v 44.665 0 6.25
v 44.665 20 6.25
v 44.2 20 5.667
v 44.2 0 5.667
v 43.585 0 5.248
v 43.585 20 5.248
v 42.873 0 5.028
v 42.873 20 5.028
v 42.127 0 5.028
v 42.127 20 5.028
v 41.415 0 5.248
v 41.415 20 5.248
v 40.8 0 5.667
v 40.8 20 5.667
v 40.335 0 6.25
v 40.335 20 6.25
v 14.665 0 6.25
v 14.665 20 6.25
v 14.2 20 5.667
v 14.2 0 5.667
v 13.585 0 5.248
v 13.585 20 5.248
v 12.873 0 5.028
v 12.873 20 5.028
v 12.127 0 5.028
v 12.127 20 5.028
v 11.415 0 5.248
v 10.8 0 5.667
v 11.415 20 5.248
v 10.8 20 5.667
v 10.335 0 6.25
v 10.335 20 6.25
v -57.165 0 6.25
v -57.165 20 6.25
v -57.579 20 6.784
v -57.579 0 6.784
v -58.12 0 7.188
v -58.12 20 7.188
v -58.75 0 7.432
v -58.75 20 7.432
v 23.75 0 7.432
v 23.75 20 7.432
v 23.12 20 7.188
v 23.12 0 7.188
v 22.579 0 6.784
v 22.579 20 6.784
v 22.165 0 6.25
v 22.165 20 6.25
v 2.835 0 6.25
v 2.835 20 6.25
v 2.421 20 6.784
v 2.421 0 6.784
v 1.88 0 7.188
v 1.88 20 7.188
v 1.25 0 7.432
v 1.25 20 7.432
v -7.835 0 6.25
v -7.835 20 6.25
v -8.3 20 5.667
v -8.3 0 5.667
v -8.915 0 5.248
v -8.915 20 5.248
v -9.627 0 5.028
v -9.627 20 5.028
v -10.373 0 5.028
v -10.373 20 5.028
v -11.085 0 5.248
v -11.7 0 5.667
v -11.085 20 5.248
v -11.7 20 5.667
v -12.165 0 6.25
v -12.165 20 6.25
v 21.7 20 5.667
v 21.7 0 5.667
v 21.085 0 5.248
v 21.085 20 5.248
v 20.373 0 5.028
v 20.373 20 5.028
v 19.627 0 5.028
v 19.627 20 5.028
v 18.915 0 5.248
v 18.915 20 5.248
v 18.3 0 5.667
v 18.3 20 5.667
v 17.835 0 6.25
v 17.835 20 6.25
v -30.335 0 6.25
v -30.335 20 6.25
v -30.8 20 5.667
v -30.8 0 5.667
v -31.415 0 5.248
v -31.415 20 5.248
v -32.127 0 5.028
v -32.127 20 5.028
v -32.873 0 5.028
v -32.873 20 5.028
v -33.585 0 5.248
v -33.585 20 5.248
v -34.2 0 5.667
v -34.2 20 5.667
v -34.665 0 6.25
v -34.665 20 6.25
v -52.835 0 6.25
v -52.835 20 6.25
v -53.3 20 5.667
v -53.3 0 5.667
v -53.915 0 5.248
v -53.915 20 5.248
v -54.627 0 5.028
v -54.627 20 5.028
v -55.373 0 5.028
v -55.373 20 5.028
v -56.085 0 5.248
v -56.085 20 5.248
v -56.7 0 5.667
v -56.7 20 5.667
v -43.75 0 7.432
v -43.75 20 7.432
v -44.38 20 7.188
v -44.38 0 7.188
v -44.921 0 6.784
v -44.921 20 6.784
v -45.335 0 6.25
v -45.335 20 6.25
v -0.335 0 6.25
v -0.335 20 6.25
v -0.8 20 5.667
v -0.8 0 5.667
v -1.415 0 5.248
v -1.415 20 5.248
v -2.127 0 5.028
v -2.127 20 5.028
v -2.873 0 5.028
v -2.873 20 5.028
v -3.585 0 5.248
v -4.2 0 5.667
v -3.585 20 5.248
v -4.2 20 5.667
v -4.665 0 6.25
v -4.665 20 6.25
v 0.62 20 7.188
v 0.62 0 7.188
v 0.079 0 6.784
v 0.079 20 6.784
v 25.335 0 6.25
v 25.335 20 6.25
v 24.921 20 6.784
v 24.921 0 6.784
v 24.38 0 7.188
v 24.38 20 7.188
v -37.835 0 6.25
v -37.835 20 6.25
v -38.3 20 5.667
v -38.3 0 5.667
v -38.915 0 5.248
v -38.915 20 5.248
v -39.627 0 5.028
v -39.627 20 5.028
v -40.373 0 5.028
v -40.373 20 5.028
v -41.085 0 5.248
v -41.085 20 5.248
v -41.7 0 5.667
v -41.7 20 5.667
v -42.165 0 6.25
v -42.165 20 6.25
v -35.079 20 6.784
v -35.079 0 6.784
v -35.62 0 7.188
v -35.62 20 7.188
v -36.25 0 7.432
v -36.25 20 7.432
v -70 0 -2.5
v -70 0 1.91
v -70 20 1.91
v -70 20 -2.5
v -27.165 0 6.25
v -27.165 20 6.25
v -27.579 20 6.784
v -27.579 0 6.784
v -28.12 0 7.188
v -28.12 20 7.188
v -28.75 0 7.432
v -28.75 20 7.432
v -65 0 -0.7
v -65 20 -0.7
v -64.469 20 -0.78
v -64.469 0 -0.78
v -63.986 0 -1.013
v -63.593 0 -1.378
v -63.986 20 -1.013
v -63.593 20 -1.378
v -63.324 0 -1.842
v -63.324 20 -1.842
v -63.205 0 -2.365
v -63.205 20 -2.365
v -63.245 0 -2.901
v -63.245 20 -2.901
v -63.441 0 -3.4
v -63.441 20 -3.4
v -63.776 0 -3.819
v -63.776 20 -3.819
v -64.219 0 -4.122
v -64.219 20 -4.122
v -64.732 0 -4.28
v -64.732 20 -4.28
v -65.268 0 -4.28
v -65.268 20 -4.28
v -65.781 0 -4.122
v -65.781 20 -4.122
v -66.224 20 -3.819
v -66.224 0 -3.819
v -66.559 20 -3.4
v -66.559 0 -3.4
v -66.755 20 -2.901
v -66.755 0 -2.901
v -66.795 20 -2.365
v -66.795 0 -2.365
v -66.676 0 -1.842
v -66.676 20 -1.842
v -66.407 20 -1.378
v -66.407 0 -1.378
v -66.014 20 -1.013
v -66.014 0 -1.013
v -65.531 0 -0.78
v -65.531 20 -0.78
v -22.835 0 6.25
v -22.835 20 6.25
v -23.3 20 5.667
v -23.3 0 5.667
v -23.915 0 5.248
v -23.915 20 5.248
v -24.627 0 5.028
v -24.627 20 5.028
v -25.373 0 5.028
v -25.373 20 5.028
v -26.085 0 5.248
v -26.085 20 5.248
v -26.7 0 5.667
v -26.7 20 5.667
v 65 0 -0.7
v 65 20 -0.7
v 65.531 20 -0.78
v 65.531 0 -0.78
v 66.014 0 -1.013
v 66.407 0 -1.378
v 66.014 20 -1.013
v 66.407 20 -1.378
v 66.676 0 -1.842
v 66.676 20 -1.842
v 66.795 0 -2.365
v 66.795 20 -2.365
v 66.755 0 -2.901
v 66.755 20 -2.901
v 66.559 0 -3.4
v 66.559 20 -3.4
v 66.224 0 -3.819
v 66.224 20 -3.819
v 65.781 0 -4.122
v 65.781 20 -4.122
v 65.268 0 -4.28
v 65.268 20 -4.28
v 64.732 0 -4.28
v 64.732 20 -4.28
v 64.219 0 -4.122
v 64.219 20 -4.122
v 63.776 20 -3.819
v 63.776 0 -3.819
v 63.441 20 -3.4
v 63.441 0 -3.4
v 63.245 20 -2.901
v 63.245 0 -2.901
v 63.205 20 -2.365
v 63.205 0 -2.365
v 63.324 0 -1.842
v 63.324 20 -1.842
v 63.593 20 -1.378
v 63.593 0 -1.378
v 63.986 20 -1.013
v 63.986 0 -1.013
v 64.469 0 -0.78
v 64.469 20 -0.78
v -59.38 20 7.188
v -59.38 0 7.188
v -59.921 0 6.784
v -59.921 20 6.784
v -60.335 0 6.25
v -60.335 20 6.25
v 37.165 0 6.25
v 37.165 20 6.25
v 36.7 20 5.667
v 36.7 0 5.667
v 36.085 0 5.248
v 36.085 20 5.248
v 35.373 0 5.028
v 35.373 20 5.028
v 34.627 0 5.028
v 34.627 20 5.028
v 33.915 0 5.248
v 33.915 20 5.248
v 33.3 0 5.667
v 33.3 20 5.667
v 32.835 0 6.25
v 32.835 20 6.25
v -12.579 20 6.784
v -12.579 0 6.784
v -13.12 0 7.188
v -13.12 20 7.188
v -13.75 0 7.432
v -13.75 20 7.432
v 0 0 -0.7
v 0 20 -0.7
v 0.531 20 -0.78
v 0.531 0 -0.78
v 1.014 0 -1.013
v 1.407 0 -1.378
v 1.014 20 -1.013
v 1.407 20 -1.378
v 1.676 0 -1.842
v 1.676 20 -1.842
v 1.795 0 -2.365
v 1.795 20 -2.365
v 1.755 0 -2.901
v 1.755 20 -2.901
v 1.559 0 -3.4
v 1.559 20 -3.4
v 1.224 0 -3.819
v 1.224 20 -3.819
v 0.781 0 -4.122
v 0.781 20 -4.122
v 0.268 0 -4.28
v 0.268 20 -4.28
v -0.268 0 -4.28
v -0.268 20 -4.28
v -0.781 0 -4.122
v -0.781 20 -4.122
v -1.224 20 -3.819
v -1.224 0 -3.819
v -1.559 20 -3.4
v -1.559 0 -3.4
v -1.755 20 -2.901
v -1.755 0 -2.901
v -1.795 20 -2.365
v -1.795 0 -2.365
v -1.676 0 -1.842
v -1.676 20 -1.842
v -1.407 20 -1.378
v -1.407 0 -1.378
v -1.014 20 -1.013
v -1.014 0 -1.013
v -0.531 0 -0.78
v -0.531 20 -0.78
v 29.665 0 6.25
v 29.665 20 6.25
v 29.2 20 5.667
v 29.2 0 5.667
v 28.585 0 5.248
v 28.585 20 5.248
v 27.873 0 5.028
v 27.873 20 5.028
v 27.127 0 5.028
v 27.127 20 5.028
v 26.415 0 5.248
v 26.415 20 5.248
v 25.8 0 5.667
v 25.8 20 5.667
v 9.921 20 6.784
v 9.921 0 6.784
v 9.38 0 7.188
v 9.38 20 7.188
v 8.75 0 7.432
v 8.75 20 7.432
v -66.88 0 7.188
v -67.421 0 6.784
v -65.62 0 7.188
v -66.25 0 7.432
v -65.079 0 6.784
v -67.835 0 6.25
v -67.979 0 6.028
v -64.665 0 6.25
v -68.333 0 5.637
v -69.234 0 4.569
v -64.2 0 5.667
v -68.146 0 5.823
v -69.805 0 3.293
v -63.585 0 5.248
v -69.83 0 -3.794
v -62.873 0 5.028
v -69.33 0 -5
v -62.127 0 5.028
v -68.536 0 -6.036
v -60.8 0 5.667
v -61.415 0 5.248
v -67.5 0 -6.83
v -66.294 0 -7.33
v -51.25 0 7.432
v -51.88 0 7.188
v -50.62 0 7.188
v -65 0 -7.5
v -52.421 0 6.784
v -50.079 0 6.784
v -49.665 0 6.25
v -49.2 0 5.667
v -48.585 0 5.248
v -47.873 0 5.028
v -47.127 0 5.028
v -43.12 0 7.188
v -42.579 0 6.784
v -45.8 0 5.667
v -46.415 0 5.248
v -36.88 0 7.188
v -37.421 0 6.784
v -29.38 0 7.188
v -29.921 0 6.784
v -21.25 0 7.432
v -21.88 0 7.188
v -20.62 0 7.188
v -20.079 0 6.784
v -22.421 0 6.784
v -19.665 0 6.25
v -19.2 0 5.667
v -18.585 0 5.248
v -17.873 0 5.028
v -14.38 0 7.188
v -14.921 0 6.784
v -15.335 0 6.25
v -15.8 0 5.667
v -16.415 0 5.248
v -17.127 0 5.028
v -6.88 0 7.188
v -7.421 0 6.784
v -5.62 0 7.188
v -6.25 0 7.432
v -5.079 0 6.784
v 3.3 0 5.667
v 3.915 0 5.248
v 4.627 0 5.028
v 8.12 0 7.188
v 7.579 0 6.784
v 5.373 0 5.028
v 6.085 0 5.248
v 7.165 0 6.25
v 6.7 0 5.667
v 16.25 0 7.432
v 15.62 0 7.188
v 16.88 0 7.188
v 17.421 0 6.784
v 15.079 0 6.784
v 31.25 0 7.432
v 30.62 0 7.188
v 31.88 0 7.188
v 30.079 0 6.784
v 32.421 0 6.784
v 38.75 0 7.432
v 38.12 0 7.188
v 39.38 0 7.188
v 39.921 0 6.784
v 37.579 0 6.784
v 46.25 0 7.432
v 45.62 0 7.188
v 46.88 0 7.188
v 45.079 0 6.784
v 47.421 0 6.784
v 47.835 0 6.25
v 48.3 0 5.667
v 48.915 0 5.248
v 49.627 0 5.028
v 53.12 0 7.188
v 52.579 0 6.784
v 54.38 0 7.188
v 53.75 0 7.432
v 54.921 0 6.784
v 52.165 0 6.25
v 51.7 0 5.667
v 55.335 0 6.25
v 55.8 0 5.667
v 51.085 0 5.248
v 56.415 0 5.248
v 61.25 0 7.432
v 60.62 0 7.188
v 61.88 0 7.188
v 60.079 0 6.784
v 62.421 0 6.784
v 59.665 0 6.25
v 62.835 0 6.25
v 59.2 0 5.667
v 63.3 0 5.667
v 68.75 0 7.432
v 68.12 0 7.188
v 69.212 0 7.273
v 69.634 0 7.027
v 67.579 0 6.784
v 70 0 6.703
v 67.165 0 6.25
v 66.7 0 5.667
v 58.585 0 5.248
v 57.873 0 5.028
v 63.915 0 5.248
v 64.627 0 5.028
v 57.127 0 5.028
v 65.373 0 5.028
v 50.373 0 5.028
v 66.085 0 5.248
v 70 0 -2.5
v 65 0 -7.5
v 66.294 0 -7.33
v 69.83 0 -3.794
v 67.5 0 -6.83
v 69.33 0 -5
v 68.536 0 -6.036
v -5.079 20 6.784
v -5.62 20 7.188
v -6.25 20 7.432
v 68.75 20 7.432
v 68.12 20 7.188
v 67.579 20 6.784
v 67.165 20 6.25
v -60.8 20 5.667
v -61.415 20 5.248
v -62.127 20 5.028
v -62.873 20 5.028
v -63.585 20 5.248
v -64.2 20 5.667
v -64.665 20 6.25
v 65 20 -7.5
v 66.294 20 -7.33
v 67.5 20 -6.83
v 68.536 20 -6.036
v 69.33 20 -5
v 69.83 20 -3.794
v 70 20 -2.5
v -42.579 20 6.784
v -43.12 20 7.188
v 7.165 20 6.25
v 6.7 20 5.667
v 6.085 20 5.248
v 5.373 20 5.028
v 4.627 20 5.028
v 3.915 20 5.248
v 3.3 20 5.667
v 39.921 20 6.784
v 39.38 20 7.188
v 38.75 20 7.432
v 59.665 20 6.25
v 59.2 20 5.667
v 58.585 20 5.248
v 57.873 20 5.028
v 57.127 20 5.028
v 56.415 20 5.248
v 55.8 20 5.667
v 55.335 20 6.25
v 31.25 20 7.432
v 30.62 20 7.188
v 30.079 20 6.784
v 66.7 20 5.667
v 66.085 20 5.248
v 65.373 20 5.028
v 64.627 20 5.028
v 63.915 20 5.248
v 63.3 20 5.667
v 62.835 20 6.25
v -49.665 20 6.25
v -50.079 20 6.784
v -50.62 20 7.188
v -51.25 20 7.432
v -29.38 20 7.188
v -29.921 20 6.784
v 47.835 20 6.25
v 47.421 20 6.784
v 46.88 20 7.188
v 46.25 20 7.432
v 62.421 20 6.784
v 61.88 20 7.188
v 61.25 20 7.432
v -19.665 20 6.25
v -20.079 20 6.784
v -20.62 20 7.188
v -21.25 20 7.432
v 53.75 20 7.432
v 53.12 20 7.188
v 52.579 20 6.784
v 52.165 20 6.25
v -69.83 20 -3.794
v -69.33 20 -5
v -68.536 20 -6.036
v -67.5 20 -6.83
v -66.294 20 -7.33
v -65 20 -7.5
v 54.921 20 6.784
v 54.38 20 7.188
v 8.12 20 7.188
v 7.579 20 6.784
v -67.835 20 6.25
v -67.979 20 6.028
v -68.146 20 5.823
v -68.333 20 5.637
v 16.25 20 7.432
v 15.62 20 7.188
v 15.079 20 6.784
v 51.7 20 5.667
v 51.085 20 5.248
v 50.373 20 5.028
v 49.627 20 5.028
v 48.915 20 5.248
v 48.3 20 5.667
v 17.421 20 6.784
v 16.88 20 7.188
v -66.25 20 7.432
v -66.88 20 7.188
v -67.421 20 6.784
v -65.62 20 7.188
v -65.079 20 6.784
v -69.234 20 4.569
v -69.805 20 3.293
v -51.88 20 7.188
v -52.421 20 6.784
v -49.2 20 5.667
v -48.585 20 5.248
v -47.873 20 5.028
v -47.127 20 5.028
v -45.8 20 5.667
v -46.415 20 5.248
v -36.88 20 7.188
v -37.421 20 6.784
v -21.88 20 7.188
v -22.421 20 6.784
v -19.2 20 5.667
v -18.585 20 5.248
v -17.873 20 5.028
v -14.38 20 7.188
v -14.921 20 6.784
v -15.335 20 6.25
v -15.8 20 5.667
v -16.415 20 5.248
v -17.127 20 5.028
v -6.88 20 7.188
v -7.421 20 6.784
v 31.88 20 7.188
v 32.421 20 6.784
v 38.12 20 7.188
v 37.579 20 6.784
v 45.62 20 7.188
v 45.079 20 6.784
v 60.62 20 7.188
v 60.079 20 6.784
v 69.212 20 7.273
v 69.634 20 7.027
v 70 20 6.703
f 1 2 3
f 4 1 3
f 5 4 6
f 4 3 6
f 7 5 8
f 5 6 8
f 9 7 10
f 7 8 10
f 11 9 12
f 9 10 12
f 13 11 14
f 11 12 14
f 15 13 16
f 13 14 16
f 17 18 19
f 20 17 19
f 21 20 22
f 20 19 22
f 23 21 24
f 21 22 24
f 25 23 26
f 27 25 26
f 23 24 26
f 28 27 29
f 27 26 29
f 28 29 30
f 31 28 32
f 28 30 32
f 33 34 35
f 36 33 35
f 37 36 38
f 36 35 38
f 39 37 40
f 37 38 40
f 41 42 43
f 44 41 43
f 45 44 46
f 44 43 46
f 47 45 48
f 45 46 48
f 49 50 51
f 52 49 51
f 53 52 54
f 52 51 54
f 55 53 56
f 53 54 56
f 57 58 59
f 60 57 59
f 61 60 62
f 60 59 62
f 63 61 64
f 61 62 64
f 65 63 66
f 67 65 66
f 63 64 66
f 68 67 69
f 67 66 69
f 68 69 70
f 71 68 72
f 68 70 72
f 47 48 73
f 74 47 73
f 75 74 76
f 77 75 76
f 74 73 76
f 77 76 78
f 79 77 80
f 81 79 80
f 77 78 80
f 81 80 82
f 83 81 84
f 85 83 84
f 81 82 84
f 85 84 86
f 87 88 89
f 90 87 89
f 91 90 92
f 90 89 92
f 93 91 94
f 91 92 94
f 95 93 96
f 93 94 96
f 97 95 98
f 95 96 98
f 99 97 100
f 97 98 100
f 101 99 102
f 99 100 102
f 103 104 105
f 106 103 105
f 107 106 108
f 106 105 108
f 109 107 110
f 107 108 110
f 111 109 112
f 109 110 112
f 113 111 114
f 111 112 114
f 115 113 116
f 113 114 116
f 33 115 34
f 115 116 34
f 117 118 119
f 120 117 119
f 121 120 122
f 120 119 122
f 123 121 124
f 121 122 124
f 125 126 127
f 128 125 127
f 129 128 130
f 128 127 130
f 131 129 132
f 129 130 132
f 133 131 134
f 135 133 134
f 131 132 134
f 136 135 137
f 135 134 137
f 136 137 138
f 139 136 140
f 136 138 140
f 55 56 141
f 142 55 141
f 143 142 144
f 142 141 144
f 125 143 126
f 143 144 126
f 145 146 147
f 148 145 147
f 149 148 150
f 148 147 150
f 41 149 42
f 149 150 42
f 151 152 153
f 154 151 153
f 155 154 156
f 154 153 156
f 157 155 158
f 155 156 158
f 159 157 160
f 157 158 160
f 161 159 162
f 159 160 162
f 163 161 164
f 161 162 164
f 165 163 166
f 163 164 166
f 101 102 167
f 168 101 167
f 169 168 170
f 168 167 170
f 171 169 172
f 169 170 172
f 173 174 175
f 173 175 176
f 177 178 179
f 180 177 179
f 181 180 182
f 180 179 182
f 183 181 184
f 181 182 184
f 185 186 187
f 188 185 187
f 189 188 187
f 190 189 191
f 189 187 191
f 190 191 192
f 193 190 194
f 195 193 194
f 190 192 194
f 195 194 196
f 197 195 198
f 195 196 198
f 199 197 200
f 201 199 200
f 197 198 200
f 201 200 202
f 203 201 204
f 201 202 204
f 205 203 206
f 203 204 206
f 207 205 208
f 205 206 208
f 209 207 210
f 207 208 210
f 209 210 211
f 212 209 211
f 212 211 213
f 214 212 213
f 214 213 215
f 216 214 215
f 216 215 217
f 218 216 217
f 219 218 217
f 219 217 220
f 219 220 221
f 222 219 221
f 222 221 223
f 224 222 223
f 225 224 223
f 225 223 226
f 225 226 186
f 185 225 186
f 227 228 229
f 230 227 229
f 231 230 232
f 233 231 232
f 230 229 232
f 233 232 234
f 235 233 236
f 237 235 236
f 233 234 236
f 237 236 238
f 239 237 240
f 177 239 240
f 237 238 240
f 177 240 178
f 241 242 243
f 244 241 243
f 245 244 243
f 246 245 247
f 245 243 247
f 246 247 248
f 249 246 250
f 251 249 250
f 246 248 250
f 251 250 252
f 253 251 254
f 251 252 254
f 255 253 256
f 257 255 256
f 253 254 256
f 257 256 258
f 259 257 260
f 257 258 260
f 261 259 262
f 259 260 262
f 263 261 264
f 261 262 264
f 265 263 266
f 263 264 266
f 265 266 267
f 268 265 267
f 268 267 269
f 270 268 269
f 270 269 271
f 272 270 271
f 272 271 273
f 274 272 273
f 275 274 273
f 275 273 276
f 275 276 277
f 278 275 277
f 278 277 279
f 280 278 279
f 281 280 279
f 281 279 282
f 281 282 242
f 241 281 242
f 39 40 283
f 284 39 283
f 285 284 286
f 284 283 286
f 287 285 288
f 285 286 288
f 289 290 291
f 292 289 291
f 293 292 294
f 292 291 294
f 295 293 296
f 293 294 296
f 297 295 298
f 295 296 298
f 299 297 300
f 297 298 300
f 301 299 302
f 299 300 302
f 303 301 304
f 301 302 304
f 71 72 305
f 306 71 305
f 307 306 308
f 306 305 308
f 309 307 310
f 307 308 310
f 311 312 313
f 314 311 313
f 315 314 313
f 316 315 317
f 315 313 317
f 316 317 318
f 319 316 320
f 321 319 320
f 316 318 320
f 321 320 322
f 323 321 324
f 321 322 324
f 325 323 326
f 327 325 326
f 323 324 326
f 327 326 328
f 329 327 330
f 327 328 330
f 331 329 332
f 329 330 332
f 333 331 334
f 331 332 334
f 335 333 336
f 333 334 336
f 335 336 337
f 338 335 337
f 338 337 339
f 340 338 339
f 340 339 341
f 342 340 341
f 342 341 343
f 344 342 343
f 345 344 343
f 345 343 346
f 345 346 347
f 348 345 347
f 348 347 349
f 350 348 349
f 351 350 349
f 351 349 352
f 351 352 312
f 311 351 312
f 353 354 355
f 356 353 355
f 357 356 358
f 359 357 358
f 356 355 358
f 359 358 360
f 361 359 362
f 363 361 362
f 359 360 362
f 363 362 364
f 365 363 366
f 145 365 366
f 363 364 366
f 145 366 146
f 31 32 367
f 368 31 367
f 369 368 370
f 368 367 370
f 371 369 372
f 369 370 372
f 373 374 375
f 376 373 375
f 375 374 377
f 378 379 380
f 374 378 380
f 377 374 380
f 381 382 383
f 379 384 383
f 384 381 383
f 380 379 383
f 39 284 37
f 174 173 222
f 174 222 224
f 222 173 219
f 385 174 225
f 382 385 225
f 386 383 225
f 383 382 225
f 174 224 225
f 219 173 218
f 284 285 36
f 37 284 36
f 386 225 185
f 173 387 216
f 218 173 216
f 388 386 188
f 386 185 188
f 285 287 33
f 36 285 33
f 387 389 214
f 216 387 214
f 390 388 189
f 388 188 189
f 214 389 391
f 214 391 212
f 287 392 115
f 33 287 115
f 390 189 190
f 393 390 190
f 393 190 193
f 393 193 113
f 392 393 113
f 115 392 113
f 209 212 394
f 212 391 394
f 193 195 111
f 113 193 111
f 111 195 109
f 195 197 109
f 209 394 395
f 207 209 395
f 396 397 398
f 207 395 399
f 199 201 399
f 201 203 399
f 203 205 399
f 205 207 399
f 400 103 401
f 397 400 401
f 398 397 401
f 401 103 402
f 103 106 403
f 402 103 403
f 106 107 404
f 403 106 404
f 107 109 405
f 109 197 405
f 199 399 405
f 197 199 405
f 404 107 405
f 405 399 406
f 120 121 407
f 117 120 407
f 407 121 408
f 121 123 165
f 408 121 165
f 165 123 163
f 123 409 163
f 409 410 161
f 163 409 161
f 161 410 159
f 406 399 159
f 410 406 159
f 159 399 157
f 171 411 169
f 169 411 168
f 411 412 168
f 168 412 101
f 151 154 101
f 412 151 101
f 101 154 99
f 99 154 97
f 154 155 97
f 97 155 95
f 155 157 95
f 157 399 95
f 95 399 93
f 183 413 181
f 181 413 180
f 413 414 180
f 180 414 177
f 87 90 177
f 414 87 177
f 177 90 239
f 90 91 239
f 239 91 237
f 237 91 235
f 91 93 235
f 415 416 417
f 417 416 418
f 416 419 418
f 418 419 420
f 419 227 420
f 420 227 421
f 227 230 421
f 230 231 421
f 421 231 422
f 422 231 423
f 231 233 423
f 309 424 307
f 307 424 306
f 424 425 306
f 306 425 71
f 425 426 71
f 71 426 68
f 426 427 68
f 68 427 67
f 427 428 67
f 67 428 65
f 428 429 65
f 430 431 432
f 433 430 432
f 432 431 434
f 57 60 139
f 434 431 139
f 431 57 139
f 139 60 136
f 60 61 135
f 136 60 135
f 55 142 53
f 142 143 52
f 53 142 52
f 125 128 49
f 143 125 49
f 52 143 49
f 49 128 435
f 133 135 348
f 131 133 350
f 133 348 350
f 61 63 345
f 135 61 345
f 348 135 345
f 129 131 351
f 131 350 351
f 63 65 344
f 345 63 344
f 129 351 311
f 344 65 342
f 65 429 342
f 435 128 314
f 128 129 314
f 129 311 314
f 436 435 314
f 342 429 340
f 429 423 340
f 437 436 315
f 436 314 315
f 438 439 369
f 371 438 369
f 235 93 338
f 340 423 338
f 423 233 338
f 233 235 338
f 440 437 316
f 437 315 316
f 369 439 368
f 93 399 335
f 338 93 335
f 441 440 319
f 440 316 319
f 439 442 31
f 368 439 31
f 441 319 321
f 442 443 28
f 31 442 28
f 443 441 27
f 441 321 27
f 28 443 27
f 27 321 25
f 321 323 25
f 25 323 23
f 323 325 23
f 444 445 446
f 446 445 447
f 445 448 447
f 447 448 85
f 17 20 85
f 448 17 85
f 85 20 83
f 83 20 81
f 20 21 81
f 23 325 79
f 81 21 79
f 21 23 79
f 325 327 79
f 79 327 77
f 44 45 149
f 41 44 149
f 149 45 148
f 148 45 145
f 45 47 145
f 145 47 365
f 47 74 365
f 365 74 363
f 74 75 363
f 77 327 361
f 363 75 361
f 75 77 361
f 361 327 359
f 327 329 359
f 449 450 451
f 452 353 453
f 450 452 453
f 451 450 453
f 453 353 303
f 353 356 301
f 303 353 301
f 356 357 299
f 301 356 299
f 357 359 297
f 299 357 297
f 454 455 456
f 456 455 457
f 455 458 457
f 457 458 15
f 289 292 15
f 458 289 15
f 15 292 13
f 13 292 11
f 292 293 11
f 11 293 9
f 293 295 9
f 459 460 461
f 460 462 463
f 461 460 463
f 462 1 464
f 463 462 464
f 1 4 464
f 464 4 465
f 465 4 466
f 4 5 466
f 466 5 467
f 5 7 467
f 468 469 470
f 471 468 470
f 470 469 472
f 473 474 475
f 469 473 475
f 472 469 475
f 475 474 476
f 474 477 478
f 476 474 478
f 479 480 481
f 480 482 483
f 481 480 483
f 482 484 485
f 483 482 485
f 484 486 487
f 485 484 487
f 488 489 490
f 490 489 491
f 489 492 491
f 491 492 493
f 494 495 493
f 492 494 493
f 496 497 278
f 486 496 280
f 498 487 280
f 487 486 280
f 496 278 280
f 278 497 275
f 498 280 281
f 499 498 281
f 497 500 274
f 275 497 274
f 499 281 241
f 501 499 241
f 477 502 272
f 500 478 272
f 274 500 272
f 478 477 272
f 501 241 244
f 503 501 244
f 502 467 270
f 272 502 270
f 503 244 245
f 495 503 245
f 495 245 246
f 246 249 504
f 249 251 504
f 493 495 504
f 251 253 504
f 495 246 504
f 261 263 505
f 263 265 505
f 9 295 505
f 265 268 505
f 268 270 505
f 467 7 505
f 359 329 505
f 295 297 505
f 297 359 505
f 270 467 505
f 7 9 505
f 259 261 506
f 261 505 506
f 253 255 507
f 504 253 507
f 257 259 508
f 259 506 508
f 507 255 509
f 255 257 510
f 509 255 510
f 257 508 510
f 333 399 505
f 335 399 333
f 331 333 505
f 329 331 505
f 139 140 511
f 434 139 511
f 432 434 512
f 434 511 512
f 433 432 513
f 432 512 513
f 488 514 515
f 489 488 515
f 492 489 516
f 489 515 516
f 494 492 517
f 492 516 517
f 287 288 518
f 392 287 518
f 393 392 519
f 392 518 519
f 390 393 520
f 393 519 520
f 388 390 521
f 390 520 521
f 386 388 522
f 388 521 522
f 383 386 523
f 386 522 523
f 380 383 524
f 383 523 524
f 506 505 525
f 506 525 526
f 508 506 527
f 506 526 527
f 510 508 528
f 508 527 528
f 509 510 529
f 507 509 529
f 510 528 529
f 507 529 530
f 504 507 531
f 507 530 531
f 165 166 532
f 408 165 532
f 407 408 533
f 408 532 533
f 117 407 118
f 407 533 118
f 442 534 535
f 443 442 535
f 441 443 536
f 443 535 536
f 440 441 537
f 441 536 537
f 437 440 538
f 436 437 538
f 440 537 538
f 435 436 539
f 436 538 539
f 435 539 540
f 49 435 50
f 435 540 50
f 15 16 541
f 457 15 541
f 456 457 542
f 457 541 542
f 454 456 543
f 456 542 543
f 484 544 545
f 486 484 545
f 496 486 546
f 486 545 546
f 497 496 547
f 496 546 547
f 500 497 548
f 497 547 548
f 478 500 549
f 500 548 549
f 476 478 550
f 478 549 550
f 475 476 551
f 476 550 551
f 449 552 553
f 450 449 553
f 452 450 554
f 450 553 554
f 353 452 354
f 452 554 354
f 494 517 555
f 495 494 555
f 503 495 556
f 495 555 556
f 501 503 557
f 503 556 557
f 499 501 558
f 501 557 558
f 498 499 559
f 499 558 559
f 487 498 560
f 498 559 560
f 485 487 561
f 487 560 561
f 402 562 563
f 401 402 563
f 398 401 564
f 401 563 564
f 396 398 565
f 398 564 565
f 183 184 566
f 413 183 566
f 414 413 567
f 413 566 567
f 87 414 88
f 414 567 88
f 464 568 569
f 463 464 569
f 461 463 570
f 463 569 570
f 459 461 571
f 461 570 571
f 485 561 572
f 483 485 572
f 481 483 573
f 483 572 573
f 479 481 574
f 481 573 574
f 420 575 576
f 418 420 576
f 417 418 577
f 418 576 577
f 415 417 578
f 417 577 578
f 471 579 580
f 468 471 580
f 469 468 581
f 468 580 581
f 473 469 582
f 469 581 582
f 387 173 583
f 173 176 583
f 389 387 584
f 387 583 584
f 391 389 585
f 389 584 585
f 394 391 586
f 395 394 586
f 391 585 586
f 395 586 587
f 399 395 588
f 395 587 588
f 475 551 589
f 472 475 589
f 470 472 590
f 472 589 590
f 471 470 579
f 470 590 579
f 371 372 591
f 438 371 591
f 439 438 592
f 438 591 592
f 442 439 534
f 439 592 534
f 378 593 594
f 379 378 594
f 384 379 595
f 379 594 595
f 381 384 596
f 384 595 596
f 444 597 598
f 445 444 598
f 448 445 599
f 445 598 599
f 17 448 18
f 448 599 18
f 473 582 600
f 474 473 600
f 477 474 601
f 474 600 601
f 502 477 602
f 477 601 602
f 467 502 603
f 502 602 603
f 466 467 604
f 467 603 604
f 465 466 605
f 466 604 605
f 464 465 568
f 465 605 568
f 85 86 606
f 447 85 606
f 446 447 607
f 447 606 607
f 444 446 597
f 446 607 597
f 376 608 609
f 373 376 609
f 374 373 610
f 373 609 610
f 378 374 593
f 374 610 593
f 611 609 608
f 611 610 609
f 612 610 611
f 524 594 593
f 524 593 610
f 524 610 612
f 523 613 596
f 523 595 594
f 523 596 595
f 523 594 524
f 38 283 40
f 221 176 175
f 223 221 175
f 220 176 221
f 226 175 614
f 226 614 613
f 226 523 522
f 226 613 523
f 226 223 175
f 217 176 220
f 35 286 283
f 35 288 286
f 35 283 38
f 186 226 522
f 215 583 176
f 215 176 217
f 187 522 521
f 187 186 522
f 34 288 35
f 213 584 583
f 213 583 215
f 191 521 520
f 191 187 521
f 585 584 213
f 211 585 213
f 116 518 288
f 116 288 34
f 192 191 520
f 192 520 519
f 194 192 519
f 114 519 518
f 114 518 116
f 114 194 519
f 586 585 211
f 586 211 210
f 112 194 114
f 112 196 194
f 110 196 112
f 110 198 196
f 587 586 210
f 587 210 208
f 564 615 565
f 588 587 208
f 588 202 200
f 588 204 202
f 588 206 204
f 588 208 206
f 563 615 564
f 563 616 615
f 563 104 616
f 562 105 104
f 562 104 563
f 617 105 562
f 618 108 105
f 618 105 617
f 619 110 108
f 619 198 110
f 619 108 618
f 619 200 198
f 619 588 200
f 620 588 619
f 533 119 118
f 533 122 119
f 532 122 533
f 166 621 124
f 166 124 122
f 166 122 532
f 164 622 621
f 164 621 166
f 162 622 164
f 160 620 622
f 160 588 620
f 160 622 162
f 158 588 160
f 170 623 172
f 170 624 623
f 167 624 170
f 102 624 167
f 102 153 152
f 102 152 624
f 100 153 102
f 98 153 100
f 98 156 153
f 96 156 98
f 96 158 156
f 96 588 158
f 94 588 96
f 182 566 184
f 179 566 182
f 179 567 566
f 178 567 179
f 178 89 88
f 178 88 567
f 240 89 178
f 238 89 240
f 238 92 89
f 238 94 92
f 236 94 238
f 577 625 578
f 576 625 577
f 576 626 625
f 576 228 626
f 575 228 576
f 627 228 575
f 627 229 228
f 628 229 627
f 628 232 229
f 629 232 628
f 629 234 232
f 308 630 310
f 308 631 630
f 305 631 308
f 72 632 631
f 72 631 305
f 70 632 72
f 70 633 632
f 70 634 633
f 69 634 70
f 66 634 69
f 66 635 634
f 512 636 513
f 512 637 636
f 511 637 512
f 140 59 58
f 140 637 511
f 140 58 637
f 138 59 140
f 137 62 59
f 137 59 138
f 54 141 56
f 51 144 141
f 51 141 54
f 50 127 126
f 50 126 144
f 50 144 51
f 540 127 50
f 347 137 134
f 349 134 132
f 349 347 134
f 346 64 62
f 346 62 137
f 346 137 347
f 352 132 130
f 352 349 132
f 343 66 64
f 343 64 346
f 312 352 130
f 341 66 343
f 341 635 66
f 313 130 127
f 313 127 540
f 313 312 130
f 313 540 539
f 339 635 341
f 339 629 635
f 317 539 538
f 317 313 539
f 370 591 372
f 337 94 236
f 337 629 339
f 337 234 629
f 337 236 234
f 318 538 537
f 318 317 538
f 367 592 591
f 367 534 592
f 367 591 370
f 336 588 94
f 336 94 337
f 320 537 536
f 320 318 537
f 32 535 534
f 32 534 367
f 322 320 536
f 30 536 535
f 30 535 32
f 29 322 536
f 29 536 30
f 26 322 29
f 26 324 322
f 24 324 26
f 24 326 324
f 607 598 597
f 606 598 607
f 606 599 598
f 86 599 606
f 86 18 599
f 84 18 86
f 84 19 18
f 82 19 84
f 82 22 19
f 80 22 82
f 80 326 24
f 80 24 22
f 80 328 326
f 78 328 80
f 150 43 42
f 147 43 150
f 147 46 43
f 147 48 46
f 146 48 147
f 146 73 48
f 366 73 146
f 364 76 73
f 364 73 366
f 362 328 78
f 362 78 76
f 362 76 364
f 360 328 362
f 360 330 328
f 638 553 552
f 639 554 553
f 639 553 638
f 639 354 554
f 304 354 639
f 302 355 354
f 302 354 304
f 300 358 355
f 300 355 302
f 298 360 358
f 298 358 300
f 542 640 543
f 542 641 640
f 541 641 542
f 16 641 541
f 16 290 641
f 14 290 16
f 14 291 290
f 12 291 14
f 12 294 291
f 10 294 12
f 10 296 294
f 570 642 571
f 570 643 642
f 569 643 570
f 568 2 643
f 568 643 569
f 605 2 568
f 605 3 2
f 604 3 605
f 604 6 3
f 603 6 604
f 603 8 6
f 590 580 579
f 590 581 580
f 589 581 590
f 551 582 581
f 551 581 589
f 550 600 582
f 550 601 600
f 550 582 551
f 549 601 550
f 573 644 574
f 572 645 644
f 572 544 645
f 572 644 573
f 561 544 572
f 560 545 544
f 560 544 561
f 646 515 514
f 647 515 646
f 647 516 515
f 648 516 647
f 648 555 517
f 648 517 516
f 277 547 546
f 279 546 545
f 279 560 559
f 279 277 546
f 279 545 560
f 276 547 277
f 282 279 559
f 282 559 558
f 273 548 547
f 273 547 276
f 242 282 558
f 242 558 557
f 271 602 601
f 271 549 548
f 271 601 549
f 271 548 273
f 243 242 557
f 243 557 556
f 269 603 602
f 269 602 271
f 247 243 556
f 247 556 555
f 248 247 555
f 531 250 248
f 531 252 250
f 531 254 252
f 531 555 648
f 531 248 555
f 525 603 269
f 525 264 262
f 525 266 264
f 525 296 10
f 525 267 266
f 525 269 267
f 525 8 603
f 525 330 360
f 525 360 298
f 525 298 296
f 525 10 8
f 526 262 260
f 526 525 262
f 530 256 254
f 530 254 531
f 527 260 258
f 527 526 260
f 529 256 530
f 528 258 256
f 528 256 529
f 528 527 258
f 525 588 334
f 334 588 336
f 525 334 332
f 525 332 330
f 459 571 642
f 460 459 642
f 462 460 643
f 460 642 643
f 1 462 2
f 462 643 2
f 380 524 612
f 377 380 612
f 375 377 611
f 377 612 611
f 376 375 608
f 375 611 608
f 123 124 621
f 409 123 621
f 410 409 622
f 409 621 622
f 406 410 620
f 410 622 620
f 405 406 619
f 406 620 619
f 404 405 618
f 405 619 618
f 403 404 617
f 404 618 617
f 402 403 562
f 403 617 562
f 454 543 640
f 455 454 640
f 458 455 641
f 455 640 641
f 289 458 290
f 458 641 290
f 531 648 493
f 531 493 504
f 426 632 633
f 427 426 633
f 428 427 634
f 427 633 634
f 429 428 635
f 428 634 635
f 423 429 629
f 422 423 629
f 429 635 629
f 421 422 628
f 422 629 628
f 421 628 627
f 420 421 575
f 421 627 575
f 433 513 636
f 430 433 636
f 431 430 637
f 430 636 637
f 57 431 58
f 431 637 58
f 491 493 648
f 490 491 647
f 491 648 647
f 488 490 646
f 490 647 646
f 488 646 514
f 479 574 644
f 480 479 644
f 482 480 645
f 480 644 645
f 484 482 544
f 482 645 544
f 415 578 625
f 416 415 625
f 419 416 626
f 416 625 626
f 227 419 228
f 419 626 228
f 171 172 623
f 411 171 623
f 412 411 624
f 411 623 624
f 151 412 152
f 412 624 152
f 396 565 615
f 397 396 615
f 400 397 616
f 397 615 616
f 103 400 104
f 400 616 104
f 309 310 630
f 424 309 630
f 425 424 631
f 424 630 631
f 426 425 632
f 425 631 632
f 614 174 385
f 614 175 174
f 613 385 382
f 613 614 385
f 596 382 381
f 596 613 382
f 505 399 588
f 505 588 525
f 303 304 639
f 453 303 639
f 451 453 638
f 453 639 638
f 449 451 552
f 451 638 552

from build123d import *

# Parameters (mm, degrees)
SKETCH1_W           = 140
SKETCH1_H           = 15
BOSS_EXTRUDE1_DEPTH = 20
SKETCH2_R           = 1.8
CUT_EXTRUDE1_DEPTH  = 74.186405842
FILLET1_R           = 5
CUT_EXTRUDE2_DEPTH  = 74.186405842
LPATTERN1_COUNT     = 42
LPATTERN1_PITCH     = 7.5
FILLET2_R           = 5


with BuildPart() as part:
    # Sketch1 → Boss-Extrude1 (new body)
    with BuildSketch(Plane(origin=(0, 0, 0), x_dir=(1, 0, 0), z_dir=(0, 1, 0))):
        Rectangle(SKETCH1_W, SKETCH1_H)
    extrude(amount=BOSS_EXTRUDE1_DEPTH)

    # Sketch2 → Cut-Extrude1 (cut, through all)
    with BuildSketch(Plane(origin=(0, 20, 0), x_dir=(1, 0, 0), z_dir=(0, 1, 0))):
        with Locations(Location((-65, 2.5, 0), (0, 0, 270))):
            Circle(SKETCH2_R)
        with Locations(Location((0, 2.5, 0), (0, 0, 270))):
            Circle(SKETCH2_R)
        with Locations(Location((65, 2.5, 0), (0, 0, 270))):
            Circle(SKETCH2_R)
    extrude(amount=-CUT_EXTRUDE1_DEPTH, mode=Mode.SUBTRACT)

    # Fillet1
    fillet1_edges = [part.edges().sort_by_distance(p)[0] for p in [
        (-70, 10, -7.5),
        (70, 10, -7.5),
    ]]
    fillet(fillet1_edges, radius=FILLET1_R)

    # Sketch3 → Cut-Extrude2 (cut, through all)
    with BuildSketch(Plane(origin=(0, 20, 0), x_dir=(1, 0, 0), z_dir=(0, 1, 0))):
        with BuildLine():
            ThreePointArc((-67.834936491, -6.25), (-70, -5), (-72.165063509, -6.25))
            ThreePointArc((-72.165063509, -6.25), (-73.080127019, -7.165063509), (-74.330127019, -7.5))
            ThreePointArc((-74.330127019, -7.5), (-70, -11.830127019), (-65.669872981, -7.5))
            ThreePointArc((-65.669872981, -7.5), (-66.919872981, -7.165063509), (-67.834936491, -6.25))
        make_face()
    cut_extrude2 = extrude(amount=-CUT_EXTRUDE2_DEPTH, mode=Mode.SUBTRACT)

    # LPattern1: Cut-Extrude2 ×42
    with Locations(*[(i * LPATTERN1_PITCH, 0, 0) for i in range(1, LPATTERN1_COUNT)]):
        add(cut_extrude2, mode=Mode.SUBTRACT)

    # Fillet2
    fillet2_edges = [part.edges().sort_by_distance(p)[0] for p in [
        (-70, 10, 5),
    ]]
    fillet(fillet2_edges, radius=FILLET2_R)


solid = part.part
